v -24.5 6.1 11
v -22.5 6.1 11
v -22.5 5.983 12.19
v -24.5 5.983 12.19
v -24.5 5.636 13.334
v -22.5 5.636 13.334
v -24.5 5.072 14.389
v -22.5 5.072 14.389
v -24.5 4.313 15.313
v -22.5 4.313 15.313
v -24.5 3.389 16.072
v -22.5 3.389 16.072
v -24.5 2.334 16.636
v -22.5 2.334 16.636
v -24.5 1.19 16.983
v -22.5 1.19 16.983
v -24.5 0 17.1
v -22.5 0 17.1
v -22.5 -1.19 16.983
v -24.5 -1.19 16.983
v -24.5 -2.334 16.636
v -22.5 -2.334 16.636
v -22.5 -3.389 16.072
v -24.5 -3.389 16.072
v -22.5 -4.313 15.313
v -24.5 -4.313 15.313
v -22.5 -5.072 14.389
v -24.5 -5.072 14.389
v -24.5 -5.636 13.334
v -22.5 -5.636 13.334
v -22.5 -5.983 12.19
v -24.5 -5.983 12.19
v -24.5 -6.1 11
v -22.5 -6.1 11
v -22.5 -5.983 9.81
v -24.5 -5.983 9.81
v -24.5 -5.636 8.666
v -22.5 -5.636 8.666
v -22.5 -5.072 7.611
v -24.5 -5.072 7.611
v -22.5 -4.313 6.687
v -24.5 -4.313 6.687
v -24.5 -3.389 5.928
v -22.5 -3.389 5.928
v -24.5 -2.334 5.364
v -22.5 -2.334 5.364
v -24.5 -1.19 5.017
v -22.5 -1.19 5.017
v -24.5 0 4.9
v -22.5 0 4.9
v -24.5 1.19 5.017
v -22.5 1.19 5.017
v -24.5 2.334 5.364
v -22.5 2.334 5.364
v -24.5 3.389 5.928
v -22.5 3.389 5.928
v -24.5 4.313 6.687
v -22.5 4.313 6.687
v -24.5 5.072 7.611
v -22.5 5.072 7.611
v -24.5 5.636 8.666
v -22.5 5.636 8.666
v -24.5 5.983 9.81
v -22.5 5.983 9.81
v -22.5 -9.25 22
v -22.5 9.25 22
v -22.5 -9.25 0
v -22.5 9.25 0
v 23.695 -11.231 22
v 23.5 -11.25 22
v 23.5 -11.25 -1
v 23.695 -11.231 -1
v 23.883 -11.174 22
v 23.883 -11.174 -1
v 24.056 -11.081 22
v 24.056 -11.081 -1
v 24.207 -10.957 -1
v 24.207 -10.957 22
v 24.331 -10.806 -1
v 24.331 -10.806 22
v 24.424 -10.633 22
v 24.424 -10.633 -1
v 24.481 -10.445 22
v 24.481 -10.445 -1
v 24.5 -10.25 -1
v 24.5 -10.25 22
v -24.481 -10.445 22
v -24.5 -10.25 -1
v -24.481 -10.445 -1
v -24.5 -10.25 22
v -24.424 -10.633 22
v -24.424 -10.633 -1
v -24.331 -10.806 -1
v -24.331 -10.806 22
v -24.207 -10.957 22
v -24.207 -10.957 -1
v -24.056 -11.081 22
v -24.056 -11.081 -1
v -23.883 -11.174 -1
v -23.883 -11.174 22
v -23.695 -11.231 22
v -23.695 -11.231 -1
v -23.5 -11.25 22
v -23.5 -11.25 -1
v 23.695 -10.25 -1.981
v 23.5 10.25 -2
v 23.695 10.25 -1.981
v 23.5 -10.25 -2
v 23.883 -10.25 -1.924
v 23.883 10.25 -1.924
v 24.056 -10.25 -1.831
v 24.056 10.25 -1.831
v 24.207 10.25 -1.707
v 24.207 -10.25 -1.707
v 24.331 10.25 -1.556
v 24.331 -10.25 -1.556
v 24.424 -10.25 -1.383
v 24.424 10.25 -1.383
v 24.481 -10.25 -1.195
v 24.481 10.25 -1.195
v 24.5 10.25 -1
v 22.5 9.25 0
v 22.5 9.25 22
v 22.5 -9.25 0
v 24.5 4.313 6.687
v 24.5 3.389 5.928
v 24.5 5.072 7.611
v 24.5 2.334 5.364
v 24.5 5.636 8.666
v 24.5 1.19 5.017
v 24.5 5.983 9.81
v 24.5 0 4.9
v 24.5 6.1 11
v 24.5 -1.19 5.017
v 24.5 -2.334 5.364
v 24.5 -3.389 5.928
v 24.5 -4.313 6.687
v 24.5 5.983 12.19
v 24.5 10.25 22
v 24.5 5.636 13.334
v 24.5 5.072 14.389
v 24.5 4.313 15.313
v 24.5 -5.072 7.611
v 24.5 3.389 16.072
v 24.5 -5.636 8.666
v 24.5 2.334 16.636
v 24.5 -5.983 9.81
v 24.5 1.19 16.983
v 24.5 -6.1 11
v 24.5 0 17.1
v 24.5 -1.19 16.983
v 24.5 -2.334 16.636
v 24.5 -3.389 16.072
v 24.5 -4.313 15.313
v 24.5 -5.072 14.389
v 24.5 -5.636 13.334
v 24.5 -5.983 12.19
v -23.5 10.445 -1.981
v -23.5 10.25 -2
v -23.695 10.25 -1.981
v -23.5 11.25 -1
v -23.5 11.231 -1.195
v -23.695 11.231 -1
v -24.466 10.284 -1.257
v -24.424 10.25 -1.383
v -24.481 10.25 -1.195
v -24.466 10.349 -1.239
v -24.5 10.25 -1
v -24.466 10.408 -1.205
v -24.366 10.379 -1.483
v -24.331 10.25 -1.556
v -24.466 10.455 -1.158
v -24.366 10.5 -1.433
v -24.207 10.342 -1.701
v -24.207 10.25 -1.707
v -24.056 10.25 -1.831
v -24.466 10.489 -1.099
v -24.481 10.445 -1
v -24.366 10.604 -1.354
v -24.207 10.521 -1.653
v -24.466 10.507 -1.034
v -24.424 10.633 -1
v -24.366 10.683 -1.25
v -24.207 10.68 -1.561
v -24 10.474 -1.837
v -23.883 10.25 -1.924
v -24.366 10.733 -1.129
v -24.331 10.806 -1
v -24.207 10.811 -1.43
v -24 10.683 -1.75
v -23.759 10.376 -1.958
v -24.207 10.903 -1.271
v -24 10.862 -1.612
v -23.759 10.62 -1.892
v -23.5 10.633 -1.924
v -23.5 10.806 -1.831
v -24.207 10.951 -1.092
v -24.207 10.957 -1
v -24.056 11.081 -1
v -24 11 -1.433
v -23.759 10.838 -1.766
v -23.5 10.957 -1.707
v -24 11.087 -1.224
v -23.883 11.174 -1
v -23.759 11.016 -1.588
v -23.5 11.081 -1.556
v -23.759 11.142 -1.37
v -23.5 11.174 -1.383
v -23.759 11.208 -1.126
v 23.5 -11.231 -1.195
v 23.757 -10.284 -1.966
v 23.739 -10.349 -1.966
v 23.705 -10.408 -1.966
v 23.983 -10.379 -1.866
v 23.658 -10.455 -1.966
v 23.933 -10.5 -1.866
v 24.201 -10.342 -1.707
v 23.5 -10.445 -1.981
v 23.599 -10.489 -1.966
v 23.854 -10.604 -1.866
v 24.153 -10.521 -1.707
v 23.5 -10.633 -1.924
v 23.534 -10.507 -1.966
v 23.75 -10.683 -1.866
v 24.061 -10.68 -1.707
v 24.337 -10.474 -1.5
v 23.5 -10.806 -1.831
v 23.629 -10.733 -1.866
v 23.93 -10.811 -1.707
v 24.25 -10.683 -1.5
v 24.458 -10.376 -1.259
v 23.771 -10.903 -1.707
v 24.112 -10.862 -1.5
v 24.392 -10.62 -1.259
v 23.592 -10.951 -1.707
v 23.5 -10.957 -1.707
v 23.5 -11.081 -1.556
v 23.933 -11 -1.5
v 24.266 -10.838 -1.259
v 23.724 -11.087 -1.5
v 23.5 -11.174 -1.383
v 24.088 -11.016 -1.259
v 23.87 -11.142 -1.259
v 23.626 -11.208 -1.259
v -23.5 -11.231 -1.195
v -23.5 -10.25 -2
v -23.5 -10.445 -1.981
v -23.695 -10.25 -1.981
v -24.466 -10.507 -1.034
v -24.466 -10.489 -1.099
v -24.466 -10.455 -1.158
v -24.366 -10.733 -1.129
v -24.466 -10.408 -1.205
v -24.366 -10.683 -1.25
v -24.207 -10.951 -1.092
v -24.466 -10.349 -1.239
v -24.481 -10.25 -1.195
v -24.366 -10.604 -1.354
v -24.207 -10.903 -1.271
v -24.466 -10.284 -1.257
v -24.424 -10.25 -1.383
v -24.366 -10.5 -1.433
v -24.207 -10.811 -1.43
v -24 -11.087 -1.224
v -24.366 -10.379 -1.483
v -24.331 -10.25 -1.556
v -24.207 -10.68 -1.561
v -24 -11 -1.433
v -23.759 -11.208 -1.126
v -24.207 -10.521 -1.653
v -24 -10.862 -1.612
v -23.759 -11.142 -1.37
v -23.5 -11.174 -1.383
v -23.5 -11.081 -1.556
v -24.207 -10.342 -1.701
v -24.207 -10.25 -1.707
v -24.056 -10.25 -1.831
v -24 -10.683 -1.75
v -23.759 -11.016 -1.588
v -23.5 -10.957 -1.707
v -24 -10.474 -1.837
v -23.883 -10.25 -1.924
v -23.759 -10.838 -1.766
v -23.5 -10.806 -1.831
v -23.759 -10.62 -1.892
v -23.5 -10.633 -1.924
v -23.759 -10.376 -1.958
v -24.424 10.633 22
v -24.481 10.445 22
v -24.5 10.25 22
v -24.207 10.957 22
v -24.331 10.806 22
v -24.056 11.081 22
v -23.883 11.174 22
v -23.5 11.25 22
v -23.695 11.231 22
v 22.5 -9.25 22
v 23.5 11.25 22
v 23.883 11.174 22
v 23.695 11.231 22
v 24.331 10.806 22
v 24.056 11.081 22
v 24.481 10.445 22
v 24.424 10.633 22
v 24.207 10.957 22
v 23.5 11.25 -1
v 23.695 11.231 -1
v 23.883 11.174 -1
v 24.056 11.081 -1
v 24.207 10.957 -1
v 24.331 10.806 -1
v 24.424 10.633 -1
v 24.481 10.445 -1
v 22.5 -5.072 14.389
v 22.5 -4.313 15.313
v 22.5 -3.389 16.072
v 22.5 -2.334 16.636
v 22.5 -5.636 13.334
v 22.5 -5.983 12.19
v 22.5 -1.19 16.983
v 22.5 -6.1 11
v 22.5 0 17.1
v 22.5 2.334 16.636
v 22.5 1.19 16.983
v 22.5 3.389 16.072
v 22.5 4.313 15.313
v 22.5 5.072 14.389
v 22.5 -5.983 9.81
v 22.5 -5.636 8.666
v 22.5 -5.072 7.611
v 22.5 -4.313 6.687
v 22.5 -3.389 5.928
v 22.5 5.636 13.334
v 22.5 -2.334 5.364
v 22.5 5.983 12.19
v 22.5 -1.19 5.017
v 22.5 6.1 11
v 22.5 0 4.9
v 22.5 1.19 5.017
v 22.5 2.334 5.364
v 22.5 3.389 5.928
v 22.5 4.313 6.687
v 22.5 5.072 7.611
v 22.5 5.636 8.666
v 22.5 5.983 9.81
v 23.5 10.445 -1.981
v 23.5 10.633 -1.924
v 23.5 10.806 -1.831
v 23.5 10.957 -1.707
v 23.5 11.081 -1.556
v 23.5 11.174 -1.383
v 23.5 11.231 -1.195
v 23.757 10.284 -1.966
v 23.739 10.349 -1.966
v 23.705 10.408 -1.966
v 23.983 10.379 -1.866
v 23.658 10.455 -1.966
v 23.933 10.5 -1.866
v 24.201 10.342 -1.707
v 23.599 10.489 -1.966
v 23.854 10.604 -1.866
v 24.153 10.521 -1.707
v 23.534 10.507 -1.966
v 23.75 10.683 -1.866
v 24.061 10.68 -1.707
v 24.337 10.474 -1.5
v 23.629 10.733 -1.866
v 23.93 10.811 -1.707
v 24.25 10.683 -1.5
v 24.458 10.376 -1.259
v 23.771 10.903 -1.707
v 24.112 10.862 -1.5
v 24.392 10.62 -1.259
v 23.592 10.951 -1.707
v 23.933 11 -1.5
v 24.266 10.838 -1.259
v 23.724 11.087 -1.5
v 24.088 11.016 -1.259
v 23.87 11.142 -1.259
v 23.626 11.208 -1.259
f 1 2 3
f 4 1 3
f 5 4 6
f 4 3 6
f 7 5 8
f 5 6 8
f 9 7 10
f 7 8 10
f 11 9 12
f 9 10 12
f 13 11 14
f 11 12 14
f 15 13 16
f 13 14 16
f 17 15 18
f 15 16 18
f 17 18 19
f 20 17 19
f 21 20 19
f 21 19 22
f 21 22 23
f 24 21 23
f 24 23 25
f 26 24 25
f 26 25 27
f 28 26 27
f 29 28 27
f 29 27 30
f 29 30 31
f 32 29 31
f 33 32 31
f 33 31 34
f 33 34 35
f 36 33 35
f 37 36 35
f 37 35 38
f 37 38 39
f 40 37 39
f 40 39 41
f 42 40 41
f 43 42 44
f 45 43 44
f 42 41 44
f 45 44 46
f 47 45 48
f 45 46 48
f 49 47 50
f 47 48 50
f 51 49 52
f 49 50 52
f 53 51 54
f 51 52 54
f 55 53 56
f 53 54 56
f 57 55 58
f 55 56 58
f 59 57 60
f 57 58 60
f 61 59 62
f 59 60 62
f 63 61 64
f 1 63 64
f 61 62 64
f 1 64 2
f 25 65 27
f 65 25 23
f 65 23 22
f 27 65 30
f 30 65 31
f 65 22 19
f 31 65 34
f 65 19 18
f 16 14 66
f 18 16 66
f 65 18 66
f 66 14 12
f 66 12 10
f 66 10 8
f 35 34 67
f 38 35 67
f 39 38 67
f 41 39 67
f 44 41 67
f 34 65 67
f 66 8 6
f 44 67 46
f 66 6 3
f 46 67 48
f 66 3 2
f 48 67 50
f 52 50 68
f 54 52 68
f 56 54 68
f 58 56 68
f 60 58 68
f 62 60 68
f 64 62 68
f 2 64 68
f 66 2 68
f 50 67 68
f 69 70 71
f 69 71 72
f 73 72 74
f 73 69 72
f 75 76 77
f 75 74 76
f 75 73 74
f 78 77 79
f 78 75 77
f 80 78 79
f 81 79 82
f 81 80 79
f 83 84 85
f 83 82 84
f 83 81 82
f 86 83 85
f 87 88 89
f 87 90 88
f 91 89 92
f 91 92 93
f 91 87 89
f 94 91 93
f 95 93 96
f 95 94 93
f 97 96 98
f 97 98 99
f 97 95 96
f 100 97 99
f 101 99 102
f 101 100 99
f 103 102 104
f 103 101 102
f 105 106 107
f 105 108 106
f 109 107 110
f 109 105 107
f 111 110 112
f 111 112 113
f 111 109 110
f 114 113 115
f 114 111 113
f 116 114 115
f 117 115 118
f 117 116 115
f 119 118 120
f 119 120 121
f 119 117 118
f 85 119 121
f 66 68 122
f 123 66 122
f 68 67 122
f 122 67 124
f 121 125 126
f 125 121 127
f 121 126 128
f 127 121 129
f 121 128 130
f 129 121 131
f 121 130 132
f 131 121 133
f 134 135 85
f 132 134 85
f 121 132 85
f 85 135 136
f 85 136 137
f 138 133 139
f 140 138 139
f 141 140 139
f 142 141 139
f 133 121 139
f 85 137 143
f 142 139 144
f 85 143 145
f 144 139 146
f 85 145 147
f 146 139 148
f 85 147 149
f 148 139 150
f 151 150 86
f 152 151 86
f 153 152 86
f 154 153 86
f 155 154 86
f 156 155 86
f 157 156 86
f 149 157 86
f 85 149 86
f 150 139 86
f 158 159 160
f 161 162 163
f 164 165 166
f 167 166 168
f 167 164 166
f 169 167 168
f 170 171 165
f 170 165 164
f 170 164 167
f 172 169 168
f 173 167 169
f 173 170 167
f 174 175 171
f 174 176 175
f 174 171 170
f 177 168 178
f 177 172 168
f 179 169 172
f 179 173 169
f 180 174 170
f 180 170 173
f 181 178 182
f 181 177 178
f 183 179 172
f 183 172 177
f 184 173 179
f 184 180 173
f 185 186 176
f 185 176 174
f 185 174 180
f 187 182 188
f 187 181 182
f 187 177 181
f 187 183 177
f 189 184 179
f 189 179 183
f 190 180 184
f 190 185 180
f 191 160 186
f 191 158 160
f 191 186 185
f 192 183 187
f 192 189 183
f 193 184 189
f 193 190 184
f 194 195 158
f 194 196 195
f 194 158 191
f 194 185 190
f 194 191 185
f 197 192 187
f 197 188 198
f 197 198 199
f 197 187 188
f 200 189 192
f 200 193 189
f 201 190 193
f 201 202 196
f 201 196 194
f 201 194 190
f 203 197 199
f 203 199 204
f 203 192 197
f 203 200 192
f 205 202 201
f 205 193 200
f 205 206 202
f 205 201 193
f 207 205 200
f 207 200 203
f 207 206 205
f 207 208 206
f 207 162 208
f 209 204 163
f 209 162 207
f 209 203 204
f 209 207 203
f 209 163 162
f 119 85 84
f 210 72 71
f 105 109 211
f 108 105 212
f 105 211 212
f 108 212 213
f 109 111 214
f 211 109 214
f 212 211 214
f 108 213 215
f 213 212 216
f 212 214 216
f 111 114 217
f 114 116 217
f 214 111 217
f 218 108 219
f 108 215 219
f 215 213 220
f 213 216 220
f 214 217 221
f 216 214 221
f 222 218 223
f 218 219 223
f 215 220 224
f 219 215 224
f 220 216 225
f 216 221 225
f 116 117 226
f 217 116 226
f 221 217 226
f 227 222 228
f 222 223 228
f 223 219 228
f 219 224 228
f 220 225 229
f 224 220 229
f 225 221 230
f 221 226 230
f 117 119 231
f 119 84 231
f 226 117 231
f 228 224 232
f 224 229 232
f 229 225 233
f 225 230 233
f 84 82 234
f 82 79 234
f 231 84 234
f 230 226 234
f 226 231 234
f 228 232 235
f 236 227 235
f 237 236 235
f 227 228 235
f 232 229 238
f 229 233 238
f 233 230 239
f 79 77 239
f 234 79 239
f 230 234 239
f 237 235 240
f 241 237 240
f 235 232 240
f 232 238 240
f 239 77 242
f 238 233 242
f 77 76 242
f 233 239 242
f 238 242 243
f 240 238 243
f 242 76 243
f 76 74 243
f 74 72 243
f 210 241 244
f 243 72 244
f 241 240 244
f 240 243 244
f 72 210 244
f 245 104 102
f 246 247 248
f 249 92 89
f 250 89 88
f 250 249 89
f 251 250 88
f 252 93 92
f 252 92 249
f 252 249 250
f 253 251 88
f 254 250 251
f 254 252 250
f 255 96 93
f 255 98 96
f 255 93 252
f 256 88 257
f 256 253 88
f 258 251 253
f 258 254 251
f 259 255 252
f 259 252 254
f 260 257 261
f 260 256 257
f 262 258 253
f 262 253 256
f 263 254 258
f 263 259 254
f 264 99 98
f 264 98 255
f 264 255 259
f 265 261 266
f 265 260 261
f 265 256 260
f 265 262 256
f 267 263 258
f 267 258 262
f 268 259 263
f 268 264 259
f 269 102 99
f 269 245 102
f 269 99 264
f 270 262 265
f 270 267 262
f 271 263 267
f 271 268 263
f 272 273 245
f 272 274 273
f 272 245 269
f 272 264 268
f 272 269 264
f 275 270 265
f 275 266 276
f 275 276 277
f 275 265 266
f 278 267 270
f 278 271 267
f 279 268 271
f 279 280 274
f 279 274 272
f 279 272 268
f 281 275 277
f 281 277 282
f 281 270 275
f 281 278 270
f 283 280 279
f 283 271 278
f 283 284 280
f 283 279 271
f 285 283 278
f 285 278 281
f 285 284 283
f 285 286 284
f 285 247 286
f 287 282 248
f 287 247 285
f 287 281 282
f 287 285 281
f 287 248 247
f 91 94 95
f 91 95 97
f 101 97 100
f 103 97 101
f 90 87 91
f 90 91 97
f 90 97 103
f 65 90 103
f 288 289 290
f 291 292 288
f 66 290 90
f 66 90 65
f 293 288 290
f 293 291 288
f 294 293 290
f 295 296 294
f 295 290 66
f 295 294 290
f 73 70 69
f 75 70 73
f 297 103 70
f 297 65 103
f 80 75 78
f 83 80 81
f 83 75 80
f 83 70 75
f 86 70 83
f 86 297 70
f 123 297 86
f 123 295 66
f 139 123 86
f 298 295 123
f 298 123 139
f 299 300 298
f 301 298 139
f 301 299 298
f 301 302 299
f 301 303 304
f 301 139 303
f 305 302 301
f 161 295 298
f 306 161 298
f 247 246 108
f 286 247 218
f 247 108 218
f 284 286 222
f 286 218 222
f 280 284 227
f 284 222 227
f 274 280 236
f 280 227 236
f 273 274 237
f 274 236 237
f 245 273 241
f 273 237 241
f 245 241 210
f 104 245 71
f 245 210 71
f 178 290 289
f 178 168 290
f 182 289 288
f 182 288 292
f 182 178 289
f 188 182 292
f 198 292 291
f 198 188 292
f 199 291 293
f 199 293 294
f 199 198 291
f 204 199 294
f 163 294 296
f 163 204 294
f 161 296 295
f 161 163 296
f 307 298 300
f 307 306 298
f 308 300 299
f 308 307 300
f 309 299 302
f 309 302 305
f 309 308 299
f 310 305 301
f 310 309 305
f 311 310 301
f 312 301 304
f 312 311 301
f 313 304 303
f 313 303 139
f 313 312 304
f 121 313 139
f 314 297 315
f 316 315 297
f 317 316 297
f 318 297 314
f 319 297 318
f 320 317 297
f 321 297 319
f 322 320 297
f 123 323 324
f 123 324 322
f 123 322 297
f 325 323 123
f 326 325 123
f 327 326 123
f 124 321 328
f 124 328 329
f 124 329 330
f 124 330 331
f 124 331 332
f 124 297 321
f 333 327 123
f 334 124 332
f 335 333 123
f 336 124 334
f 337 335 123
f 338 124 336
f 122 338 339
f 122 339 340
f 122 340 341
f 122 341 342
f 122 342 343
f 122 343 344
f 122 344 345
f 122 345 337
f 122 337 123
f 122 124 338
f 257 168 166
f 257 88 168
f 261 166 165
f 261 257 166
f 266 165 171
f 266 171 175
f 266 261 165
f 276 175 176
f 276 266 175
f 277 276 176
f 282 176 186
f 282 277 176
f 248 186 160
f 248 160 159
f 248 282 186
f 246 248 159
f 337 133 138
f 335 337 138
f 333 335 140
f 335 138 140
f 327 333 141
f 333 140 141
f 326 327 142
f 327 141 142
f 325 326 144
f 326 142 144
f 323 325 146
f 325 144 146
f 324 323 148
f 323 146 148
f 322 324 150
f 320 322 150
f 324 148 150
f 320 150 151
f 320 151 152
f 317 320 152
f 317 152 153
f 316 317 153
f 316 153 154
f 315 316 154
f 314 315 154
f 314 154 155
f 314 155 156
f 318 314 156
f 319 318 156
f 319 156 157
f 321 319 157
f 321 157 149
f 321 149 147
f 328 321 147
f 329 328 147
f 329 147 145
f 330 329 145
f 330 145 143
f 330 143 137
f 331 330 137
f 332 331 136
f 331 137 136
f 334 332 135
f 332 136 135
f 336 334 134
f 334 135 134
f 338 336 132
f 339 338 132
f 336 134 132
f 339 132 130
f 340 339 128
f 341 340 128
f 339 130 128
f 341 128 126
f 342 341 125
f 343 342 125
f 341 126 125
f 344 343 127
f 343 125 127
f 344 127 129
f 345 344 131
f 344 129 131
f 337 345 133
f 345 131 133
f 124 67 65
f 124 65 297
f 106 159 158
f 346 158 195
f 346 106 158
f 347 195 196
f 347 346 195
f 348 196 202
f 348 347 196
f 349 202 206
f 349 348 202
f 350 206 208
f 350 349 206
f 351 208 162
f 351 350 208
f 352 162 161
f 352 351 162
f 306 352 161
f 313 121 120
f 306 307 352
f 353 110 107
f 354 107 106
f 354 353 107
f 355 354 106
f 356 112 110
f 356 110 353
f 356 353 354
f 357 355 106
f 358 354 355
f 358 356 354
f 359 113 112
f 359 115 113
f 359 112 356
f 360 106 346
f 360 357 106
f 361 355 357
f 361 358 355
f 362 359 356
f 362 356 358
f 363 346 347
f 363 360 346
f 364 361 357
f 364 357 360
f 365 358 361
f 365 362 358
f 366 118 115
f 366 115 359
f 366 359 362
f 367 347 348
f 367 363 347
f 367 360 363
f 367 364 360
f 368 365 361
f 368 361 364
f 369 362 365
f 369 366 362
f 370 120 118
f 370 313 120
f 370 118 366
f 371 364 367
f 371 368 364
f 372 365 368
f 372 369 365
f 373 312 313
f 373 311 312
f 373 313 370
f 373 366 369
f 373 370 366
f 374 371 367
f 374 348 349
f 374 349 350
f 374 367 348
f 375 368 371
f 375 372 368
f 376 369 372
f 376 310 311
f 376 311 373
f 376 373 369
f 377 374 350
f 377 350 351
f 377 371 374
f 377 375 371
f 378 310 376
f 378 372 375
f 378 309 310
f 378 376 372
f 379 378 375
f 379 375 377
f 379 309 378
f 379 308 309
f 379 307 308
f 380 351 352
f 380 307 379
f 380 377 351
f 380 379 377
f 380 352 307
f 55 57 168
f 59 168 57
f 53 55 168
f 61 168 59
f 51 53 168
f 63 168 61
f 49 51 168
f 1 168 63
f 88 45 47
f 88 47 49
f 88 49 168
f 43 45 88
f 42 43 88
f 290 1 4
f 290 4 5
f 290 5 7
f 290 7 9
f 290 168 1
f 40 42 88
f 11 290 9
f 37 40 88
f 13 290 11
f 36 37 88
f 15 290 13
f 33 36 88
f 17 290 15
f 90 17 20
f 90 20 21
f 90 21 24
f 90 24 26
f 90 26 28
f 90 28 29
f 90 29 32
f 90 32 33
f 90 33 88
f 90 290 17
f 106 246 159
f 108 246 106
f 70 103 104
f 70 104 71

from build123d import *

# Parameters (mm, degrees)
F0_W     = 49
F0_H     = 22.5
F0_W_2   = 45
F0_H_2   = 18.5
F1_DEPTH = 22
F2_W     = 49
F2_H     = 22.5
F3_DEPTH = 2
F4_R     = 6.1
F5_DEPTH = 49.001
F6_R     = 1


with BuildPart() as f1:
    # F0 (on Top) → F1 (new body)
    with BuildSketch(Plane.XY):
        Rectangle(F0_W, F0_H)
        Rectangle(F0_W_2, F0_H_2, mode=Mode.SUBTRACT)
    extrude(amount=F1_DEPTH)

    # F2 (on face) → F3 (join)
    with BuildSketch(Plane(origin=(0, 0, 0), x_dir=(1, 0, 0), z_dir=(0, 0, -1))):
        Rectangle(F2_W, F2_H)
    extrude(amount=F3_DEPTH)

    # F4 (on face) → F5 (cut, through all)
    with BuildSketch(Plane.YZ.offset(24.5)):
        with Locations((0, 11)):
            Circle(F4_R)
    extrude(amount=-F5_DEPTH, mode=Mode.SUBTRACT)

    # F6
    f6_edges = [f1.edges().sort_by_distance(p)[0] for p in [
        (24.5, -11.25, 10),
        (24.5, 11.25, 10),
        (24.5, 0, -2),
        (0, 11.25, -2),
        (0, -11.25, -2),
        (-24.5, -11.25, 10),
        (-24.5, 0, -2),
        (-24.5, 11.25, 10),
    ]]
    fillet(f6_edges, radius=F6_R)


solid = f1.part
